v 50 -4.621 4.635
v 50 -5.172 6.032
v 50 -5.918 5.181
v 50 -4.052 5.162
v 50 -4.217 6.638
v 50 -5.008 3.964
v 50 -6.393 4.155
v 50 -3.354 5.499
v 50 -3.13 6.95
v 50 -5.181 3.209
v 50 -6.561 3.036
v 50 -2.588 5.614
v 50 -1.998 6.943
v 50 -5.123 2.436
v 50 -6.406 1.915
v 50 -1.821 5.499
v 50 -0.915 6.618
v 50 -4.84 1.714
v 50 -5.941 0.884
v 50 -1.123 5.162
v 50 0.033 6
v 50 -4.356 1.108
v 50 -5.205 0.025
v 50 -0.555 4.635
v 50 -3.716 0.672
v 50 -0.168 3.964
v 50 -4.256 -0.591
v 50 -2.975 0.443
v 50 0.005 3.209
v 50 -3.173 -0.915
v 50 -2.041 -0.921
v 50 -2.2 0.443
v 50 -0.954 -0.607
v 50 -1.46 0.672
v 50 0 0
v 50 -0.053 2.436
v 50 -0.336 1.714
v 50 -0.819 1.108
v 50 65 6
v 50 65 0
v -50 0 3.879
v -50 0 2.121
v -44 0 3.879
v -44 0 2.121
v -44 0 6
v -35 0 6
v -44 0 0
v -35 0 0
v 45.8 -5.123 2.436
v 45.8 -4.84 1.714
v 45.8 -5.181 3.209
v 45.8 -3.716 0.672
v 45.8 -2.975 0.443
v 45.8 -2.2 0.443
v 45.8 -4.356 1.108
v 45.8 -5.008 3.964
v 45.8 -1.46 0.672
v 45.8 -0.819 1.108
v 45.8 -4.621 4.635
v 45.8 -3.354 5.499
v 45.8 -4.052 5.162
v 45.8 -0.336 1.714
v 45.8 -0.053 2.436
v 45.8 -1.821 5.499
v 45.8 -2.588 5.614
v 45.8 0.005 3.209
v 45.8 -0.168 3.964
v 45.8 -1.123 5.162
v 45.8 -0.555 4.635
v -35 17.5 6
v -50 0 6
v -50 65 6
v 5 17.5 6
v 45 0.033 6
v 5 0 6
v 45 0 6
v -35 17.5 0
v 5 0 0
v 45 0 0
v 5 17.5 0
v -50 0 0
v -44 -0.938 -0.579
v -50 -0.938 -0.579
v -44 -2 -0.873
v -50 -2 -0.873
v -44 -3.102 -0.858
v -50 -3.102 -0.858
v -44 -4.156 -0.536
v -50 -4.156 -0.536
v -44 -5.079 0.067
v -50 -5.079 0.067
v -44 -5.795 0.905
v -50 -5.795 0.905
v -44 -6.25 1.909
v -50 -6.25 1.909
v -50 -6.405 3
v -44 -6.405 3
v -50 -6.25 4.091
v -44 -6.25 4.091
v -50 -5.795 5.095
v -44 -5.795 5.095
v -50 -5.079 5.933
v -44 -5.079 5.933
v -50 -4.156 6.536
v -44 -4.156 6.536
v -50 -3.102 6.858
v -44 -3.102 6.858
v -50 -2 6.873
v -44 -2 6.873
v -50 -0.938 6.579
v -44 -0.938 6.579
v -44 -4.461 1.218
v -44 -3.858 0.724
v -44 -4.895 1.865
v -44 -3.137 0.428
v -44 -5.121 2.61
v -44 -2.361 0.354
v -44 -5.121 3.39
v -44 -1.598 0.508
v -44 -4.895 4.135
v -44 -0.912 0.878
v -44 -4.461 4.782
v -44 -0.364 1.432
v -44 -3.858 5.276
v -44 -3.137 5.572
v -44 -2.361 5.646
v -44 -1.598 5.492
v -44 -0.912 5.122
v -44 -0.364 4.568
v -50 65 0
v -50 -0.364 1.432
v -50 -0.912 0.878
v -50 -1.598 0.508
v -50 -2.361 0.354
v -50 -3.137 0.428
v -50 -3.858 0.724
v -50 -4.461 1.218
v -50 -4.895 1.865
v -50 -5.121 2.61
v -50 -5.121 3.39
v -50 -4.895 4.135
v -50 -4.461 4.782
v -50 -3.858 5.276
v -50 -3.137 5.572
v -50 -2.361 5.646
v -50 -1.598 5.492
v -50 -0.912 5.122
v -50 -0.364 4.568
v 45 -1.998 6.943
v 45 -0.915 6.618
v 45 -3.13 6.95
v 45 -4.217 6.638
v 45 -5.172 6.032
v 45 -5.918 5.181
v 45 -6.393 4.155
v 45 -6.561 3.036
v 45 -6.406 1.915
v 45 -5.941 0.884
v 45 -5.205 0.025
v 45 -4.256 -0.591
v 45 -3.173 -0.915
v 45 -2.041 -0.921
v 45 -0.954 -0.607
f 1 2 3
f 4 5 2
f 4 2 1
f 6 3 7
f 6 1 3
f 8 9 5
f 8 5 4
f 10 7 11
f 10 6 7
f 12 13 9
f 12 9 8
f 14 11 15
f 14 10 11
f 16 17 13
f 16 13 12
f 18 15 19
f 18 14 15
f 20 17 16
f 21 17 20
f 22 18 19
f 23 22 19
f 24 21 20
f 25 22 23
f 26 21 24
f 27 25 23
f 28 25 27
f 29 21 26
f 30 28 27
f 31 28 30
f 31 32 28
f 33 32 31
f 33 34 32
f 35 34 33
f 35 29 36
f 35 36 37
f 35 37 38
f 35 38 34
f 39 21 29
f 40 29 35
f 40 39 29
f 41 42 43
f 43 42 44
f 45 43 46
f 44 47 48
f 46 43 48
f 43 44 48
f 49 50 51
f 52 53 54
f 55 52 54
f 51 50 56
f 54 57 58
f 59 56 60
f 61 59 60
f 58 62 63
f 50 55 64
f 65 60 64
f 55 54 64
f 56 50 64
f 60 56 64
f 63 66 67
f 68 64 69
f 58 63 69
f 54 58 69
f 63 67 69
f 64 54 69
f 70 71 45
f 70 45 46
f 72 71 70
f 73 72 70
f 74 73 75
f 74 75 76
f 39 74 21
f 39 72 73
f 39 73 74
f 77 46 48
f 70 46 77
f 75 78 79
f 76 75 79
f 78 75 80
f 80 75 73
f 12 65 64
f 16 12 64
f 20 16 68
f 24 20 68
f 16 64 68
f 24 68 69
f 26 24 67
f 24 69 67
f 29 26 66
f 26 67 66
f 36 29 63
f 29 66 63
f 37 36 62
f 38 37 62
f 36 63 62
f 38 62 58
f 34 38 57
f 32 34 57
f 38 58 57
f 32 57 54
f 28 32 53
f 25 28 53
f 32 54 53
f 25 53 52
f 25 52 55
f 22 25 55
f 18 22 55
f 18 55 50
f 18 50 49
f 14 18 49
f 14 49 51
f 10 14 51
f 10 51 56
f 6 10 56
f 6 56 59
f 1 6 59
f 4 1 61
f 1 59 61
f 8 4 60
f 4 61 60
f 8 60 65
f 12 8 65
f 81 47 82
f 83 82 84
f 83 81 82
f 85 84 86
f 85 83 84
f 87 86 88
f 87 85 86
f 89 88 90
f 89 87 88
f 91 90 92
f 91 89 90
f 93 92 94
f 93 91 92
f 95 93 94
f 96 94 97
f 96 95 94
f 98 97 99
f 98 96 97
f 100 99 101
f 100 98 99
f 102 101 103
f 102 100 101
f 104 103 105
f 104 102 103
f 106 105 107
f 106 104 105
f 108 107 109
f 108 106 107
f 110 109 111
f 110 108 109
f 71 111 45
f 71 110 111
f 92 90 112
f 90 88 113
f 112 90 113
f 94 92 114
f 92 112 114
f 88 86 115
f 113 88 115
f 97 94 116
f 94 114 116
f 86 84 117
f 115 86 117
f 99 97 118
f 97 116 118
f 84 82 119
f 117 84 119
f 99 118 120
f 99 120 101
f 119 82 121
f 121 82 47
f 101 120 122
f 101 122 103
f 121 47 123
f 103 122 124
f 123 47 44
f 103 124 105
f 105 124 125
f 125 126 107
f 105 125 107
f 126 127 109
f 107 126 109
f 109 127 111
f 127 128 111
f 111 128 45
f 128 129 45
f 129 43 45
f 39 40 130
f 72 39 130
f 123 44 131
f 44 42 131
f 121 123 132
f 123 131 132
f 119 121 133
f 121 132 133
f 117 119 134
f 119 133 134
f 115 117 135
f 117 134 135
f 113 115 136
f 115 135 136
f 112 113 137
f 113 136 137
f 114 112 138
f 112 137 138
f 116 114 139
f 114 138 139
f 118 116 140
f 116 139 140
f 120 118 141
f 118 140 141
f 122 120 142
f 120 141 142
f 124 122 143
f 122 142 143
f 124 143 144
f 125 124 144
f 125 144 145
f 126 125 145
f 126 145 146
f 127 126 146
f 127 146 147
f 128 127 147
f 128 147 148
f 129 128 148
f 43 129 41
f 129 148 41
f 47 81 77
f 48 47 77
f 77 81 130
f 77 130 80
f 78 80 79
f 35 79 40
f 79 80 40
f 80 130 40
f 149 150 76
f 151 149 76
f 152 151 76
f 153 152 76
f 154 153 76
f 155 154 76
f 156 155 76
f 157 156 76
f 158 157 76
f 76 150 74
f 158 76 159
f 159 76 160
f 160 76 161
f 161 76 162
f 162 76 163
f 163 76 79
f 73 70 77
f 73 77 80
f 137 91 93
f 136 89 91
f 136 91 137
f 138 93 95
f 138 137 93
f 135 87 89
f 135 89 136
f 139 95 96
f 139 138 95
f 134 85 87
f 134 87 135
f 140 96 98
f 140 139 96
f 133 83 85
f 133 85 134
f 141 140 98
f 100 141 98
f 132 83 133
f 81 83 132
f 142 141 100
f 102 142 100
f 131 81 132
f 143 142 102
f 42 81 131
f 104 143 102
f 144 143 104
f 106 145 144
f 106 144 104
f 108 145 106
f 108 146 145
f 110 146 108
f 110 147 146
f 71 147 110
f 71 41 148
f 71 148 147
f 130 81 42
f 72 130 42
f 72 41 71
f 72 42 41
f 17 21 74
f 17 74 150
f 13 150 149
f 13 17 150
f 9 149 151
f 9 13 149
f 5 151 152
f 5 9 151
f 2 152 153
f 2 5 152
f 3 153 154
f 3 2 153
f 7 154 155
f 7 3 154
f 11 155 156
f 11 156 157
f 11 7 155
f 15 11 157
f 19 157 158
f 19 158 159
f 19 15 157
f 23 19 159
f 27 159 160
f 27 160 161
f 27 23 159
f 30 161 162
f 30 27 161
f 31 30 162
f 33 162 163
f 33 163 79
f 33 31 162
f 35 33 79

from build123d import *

# Parameters (mm, degrees)
EXTRUDE_1_DEPTH     = 6
SKETCH_2_R          = 3.905124838
SKETCH_2_R_2        = 2.65
EXTRUDE_6_DEPTH     = 6
SKETCH_3_R          = 3.972728699
EXTRUDE_7_DEPTH     = 5
CUT_EXTRUDE_START   = -0.8
SKETCH_4_R          = 2.6
CUT_EXTRUDE_1_DEPTH = 4.2
SKETCH_5_W          = 40
SKETCH_5_H          = 17.5
CUT_EXTRUDE_2_DEPTH = 10


with BuildPart() as part:
    # 草图1 → 凸台-拉伸1 (new body)
    with BuildSketch(Plane.XY):
        Polygon((0, 0), (50, 0), (50, 65), (-50, 65), (-50, 0), align=None)
    extrude(amount=EXTRUDE_1_DEPTH)

    # 草图2 → 凸台-拉伸6 (add)
    with BuildSketch(Plane.ZY.offset(50)):
        with Locations((3, -2.5)):
            Circle(SKETCH_2_R)
        with Locations((3, -2.5)):
            Circle(SKETCH_2_R_2, mode=Mode.SUBTRACT)
    extrude(amount=-EXTRUDE_6_DEPTH)

    # 草图3 → 凸台-拉伸7 (add)
    with BuildSketch(Plane(origin=(50, 0, 0), x_dir=(0, 0, -1), z_dir=(1, 0, 0))):
        with Locations((-3.014231345, -2.587852917)):
            Circle(SKETCH_3_R)
    extrude(amount=-EXTRUDE_7_DEPTH)

    # 草图4 → 切除-拉伸1 (cut)
    with BuildSketch(Plane.ZY.offset(-45).offset(CUT_EXTRUDE_START)):
        with Locations((3.014231345, -2.587852917)):
            Circle(SKETCH_4_R)
    extrude(amount=-CUT_EXTRUDE_1_DEPTH, mode=Mode.SUBTRACT)

    # 草图5 → 切除-拉伸2 (cut)
    with BuildSketch(Plane.XY.offset(6)):
        with Locations((-15, 8.75)):
            Rectangle(SKETCH_5_W, SKETCH_5_H)
    extrude(amount=-CUT_EXTRUDE_2_DEPTH, mode=Mode.SUBTRACT)


solid = part.part
